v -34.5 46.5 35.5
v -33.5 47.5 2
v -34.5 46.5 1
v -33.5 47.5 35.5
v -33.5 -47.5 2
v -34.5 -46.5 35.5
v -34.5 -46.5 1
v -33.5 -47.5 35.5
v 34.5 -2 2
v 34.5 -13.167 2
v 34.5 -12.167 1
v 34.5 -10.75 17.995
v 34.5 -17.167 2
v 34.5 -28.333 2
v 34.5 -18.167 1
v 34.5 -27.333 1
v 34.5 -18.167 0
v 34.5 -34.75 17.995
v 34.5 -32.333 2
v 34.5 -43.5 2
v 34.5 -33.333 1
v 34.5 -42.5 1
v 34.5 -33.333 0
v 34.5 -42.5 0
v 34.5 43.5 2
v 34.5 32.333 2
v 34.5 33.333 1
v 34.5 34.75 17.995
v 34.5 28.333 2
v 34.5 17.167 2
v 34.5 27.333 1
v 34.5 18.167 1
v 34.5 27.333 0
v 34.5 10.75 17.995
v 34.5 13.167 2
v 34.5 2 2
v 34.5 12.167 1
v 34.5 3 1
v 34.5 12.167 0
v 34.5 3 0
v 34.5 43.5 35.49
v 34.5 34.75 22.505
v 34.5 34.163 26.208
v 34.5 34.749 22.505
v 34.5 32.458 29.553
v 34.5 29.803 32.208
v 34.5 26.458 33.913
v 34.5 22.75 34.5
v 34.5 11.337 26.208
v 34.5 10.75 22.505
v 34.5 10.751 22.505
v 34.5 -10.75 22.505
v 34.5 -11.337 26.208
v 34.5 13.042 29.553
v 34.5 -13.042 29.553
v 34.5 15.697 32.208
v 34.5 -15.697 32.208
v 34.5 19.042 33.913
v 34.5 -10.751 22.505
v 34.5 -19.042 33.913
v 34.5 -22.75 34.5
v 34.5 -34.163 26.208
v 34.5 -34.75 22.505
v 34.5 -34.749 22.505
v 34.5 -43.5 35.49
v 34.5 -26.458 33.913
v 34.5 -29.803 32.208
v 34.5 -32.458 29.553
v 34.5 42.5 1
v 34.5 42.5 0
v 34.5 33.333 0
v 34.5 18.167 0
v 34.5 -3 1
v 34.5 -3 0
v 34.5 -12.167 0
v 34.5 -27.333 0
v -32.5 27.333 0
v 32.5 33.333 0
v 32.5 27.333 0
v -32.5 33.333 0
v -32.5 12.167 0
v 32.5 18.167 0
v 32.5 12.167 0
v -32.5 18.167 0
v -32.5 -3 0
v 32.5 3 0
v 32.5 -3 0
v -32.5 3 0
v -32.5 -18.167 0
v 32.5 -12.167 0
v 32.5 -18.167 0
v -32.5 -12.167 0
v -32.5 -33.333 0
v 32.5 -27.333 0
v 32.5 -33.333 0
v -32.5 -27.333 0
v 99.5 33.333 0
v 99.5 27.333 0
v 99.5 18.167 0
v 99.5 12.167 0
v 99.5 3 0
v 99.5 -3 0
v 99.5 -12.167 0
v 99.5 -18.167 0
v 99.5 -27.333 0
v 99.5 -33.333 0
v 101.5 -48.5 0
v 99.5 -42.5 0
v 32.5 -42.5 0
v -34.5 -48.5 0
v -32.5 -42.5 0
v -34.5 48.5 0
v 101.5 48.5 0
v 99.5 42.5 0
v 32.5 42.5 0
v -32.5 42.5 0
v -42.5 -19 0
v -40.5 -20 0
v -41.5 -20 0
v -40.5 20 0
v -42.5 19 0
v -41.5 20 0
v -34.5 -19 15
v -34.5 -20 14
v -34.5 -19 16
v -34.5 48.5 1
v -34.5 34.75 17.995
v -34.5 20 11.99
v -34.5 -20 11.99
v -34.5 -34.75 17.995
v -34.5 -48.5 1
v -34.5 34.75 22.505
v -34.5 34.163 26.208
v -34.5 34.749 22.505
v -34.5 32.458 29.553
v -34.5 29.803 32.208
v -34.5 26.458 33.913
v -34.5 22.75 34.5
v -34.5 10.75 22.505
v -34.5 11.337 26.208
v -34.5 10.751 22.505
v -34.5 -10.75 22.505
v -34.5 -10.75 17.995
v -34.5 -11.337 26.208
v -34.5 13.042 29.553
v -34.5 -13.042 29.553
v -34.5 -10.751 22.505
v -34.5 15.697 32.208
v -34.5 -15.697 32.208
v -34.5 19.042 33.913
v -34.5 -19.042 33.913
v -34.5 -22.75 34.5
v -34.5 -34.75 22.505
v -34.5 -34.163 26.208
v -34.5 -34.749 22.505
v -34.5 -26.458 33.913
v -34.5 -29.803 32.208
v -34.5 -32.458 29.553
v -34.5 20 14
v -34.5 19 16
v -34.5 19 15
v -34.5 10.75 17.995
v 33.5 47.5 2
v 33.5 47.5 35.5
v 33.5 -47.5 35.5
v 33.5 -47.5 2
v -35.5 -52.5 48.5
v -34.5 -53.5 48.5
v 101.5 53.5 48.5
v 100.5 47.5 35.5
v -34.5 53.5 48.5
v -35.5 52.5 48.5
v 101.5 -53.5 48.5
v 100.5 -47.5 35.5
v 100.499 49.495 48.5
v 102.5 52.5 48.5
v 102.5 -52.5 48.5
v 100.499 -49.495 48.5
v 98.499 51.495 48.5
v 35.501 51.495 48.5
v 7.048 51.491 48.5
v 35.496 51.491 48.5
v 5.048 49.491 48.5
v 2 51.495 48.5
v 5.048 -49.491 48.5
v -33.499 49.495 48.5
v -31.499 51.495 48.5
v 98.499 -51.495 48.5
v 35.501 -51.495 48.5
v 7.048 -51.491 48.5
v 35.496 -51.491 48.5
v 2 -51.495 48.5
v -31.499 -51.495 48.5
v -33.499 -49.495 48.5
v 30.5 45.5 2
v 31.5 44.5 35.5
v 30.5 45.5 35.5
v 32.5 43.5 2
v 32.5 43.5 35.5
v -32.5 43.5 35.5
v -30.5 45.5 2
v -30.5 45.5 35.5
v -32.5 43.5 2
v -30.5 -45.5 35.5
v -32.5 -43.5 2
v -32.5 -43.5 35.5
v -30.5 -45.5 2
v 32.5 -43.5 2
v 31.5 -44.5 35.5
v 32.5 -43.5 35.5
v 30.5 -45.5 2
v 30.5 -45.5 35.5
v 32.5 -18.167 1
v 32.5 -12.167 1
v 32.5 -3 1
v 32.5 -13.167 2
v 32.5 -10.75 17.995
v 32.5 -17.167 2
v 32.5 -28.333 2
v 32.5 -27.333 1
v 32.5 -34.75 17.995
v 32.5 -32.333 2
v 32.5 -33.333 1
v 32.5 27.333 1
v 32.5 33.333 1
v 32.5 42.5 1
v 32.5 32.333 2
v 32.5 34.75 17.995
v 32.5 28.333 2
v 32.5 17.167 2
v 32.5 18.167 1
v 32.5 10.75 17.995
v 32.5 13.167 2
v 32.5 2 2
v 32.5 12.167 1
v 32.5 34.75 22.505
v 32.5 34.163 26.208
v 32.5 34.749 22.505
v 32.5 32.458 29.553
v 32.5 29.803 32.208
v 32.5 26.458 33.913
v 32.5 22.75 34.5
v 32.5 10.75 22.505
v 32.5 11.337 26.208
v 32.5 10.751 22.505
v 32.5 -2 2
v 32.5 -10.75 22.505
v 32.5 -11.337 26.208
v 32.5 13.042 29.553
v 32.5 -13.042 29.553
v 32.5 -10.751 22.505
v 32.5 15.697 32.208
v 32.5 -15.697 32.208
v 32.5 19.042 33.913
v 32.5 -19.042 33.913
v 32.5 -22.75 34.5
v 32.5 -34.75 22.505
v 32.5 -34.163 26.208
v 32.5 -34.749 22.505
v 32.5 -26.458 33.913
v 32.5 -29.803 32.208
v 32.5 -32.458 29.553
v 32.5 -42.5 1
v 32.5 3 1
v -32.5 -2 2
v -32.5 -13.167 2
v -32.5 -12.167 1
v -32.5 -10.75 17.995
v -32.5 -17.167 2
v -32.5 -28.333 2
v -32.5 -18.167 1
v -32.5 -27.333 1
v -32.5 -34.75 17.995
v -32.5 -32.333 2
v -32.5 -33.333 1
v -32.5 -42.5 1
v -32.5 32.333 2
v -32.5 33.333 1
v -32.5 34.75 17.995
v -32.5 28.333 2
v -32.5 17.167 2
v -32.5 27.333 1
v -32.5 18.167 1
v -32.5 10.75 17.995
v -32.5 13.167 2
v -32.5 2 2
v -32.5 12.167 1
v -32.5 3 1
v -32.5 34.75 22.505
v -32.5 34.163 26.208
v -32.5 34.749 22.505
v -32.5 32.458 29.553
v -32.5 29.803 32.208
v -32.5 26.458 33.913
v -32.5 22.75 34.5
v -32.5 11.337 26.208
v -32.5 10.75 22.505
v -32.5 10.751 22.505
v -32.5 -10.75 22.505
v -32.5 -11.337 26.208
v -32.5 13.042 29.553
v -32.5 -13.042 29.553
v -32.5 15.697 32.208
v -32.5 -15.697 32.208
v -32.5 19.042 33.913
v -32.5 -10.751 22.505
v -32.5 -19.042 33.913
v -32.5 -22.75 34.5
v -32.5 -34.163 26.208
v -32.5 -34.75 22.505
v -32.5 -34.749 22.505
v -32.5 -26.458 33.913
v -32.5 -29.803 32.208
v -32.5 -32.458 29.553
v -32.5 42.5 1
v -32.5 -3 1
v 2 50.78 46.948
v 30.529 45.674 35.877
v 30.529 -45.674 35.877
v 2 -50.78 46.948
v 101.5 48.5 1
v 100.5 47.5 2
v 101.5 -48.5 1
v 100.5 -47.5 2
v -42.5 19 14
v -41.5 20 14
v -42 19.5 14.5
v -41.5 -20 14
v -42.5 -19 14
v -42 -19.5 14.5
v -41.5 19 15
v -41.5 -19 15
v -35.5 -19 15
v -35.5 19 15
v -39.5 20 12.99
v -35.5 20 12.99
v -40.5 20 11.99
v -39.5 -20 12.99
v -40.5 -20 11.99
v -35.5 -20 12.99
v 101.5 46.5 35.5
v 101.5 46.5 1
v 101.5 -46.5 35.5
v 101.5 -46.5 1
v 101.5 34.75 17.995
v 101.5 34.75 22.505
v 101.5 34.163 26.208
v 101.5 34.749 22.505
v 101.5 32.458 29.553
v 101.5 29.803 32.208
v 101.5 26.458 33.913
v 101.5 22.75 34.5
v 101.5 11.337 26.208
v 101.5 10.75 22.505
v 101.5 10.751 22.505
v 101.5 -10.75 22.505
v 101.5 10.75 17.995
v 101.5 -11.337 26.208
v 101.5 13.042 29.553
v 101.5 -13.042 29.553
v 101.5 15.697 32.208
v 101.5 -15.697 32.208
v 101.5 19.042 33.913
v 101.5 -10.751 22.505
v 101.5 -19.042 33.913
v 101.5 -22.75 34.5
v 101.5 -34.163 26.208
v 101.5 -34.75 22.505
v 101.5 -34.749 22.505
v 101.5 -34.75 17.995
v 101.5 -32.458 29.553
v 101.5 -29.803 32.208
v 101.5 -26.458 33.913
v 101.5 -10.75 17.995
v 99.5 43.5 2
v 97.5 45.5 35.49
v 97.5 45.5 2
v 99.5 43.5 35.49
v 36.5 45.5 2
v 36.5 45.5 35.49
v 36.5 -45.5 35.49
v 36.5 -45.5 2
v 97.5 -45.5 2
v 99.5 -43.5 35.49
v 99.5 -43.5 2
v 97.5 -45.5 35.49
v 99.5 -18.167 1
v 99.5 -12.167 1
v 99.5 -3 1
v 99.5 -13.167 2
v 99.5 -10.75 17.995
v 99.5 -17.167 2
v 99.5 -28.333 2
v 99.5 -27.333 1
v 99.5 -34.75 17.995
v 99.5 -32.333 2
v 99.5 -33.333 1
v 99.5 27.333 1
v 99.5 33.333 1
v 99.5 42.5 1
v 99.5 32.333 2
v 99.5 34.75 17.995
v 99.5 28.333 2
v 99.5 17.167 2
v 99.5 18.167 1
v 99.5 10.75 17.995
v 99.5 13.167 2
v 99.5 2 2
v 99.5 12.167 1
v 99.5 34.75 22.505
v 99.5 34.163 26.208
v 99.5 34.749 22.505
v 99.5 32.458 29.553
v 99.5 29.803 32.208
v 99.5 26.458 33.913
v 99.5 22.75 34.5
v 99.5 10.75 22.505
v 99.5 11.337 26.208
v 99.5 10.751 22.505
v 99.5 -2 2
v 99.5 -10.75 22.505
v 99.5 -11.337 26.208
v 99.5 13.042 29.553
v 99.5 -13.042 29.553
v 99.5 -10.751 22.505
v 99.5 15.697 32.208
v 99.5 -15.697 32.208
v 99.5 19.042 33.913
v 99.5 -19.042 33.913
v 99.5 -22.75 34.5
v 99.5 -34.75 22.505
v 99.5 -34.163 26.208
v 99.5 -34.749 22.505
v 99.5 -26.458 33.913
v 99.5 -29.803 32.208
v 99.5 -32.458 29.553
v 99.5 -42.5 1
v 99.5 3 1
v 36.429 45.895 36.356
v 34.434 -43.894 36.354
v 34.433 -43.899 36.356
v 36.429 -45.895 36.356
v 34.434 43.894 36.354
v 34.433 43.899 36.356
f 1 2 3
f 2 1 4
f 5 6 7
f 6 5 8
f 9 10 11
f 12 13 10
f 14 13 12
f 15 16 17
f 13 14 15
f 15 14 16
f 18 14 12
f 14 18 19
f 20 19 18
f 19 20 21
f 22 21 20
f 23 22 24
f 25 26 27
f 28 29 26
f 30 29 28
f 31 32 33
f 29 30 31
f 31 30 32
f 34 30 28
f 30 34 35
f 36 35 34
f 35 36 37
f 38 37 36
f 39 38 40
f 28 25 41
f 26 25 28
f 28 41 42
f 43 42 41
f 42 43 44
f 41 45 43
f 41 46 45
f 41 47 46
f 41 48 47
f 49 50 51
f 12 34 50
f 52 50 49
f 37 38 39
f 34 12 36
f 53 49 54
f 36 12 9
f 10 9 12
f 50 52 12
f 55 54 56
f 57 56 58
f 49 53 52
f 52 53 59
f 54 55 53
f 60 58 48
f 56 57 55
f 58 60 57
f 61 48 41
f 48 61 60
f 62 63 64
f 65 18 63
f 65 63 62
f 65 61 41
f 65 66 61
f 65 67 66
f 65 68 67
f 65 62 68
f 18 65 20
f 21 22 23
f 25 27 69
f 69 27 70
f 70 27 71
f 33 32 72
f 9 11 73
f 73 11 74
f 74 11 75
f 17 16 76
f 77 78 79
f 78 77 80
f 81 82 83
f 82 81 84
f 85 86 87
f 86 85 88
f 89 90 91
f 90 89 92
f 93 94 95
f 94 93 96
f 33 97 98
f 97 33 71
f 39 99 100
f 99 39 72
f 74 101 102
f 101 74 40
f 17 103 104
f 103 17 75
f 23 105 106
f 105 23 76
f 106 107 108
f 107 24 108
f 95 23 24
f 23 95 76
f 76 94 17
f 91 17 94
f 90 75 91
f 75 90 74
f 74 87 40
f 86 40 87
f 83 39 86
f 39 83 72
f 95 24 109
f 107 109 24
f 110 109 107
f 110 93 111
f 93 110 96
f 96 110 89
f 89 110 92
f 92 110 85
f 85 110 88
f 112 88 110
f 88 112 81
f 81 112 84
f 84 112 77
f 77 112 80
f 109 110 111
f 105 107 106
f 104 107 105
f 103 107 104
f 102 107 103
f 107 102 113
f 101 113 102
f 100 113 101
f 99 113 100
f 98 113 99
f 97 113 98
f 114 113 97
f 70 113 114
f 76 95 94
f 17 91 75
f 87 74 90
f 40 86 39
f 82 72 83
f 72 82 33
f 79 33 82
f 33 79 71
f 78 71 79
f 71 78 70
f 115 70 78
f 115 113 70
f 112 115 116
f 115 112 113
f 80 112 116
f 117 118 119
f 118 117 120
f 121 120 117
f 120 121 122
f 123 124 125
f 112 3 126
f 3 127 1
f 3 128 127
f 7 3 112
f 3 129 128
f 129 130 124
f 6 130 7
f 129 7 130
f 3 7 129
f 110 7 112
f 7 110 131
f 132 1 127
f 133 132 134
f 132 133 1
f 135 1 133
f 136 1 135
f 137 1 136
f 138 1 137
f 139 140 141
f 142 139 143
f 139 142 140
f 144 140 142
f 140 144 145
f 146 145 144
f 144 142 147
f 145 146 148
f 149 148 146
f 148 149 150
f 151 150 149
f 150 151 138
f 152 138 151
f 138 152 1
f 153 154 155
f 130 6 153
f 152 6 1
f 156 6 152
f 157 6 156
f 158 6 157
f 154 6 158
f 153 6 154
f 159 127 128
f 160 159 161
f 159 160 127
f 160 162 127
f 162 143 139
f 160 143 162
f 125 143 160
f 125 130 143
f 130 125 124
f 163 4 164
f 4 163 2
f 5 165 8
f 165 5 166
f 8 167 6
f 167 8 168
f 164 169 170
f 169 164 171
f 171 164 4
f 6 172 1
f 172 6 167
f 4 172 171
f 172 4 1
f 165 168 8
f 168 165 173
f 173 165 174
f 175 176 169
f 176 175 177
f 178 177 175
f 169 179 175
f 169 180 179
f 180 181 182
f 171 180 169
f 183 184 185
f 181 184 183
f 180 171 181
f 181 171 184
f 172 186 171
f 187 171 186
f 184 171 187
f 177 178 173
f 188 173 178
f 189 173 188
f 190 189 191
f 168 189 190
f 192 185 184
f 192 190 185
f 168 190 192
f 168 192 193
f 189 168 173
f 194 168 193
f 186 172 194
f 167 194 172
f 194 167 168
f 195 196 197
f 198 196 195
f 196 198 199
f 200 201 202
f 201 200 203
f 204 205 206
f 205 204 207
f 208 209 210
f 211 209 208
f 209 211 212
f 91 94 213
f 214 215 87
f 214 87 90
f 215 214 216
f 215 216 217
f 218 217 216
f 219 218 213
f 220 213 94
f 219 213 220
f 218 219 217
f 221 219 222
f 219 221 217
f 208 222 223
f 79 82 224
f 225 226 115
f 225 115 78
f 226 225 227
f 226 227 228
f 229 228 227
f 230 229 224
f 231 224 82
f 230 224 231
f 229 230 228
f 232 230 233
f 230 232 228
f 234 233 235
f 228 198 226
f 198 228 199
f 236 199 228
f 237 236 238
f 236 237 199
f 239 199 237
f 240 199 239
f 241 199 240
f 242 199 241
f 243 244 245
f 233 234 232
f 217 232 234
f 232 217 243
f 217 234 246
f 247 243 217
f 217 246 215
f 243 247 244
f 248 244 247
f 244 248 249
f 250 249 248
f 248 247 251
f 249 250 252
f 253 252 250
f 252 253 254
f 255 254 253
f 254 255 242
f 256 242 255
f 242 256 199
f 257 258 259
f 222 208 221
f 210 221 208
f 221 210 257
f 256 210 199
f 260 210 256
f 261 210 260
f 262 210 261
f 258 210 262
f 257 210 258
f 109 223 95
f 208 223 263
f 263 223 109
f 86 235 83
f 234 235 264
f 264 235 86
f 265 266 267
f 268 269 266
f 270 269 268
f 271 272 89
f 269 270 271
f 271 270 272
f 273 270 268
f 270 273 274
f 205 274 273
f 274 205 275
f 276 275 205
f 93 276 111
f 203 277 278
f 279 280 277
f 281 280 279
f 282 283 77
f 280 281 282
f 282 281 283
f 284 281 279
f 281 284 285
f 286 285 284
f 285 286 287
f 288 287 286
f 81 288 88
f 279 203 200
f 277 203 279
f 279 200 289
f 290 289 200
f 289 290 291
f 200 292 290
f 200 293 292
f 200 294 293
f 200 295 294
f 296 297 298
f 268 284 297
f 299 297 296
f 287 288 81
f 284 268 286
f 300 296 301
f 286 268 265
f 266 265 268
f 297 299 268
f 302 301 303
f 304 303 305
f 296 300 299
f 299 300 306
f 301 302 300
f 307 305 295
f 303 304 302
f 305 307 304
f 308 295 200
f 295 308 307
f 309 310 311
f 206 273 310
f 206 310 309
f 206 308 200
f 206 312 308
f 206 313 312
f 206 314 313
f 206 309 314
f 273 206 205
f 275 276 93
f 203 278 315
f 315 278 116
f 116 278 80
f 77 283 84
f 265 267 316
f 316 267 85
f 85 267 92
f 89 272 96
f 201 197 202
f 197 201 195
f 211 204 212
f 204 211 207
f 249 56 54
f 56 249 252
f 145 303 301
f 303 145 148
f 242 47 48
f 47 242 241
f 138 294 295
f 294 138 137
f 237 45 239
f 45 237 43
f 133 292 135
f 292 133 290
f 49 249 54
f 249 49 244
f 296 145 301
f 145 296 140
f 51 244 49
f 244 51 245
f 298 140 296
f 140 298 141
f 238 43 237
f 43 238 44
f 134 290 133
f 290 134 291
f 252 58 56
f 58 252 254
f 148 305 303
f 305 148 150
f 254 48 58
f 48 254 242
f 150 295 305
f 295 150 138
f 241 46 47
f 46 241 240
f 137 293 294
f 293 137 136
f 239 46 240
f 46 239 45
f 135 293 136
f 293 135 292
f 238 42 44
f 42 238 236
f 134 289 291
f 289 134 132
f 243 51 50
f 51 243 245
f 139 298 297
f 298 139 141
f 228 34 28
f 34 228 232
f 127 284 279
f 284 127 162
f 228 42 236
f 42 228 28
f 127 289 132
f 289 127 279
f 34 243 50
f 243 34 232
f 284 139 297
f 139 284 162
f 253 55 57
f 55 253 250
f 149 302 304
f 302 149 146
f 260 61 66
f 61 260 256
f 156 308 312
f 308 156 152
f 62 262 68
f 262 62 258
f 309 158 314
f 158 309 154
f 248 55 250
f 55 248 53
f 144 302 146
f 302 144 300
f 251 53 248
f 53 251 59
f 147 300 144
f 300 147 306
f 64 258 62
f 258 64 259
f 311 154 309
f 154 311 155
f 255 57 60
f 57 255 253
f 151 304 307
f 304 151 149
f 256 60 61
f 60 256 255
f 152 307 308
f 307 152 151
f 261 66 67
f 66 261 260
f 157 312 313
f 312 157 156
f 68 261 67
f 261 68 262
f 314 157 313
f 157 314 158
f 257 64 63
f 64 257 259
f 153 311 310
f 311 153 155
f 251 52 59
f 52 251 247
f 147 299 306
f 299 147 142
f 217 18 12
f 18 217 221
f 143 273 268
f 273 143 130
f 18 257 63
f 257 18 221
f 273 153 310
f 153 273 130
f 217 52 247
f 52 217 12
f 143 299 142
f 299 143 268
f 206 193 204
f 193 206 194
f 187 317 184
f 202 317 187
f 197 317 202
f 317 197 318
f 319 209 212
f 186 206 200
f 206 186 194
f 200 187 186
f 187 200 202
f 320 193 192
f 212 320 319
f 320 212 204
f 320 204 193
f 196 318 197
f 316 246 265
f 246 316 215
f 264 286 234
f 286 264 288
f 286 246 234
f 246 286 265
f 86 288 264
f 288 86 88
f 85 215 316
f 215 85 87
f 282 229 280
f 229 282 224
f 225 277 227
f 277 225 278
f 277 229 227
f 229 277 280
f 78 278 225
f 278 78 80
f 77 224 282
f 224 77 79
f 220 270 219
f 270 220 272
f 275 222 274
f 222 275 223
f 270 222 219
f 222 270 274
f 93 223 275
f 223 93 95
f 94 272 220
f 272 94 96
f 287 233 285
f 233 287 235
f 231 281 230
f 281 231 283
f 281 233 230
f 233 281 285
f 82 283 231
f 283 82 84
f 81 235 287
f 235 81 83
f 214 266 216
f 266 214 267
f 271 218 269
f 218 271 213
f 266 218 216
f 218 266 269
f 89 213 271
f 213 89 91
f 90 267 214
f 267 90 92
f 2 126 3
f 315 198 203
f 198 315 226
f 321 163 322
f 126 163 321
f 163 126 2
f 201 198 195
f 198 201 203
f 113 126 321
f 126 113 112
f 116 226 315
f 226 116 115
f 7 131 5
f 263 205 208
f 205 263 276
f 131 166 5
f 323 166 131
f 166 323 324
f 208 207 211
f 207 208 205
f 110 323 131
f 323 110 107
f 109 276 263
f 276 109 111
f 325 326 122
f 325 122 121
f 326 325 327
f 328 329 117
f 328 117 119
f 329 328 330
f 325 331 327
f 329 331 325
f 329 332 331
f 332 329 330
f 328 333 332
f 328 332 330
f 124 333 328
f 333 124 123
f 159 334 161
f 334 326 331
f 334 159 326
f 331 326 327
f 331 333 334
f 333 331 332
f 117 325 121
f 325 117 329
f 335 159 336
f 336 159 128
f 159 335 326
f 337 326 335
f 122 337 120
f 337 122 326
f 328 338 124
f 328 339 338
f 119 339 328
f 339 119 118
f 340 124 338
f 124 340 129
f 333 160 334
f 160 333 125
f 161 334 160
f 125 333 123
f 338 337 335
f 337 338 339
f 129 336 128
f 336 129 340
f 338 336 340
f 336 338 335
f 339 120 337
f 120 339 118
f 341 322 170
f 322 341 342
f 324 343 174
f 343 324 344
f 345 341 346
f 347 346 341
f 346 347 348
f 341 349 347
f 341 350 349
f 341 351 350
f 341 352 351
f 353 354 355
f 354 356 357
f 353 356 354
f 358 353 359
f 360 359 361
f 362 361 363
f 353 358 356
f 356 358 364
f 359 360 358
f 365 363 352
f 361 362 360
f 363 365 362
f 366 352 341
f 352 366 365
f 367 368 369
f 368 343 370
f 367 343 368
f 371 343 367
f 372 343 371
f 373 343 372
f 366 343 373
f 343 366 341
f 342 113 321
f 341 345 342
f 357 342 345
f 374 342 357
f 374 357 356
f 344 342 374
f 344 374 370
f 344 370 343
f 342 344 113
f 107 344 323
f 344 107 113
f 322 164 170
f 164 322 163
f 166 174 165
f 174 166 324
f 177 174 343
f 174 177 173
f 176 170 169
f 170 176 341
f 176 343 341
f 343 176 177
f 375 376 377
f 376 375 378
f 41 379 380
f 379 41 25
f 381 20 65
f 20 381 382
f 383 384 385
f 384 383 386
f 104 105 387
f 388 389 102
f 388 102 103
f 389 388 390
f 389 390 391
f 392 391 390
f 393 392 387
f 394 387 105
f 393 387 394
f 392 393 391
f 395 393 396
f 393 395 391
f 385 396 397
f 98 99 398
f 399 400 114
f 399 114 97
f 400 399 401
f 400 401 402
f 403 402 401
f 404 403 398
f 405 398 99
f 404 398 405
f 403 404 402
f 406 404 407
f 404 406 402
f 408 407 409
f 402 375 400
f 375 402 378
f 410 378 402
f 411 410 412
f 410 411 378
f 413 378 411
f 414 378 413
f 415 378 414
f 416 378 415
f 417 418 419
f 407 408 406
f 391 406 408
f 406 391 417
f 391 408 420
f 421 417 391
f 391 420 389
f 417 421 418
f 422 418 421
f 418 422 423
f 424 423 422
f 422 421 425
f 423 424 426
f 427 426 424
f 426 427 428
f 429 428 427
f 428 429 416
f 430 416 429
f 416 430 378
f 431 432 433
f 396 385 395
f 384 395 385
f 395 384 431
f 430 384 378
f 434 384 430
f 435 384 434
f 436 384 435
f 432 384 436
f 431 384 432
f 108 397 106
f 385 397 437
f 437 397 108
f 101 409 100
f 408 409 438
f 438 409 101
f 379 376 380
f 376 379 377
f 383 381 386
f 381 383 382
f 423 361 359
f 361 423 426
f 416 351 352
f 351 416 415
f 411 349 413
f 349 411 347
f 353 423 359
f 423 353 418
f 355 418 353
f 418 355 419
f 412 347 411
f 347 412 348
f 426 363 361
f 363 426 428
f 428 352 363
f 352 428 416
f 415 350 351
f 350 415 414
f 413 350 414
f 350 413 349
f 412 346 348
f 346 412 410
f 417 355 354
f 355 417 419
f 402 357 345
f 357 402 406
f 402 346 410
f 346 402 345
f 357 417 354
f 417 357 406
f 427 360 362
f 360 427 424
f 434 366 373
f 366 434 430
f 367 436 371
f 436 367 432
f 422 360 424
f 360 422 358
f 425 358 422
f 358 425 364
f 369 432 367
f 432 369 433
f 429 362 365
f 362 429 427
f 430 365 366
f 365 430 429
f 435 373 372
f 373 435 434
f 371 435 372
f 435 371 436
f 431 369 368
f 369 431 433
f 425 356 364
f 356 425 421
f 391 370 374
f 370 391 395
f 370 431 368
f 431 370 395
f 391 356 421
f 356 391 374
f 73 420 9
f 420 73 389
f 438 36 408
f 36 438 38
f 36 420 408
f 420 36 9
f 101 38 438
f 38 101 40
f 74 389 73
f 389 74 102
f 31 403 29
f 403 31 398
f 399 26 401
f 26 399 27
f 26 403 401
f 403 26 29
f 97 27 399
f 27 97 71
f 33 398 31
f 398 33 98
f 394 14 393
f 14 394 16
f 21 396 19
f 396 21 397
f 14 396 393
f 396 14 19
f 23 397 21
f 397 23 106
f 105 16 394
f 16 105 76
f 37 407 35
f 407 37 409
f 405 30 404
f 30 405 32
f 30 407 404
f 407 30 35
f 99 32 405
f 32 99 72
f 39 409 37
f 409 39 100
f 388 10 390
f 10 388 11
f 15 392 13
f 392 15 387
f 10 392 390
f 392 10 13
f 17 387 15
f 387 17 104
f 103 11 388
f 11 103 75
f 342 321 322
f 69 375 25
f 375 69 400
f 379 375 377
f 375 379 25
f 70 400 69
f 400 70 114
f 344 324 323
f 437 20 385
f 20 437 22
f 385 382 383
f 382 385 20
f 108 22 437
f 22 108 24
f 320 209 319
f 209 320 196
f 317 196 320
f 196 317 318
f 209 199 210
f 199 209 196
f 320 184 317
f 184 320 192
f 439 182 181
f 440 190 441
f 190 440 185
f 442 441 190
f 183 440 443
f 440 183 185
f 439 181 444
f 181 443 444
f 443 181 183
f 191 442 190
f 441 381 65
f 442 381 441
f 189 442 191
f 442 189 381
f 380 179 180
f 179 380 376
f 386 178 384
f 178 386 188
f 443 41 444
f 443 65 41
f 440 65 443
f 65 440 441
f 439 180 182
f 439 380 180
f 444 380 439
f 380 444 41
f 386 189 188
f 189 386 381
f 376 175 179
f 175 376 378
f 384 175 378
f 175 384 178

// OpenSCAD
// file: base_objects.scad
/*

  base_objects.scad
  
  (c) olikraus@gmail.com

  This work is licensed under the Creative Commons Attribution-NonCommercial-ShareAlike 4.0 International License.
  To view a copy of this license, visit http://creativecommons.org/licenses/by-nc-sa/4.0/.

  SquareFrustum(bottom=[10,10], top=[0,0], h=10, ChamferBody=1)
  CenterCube(dim, ChamferBody = 0, ChamferBottom=0, ChamferTop=0)
  Archoid(r=10, b=20, l=30)

*/


/*
  SquareFrustum(bottom=[10,10], top=[0,0], h=10)
  https://en.wikipedia.org/wiki/Frustum
  
  Args:
    buttom: Bottom square (width, height)
    top: Top square (width, height)
    h: Distance of the top square to z=0 plane
    ChamferBody: The amount to chamfer for edges parallel to z axis
  Notes:
    The bottom square is placed in the z=0 plane.
    The squares are centered around z axis.
  Example:
    SquareFrustum([20,20], [10,4], h=20);
    

    // create a rectangle bowl
    // same example as for CenterCube
    // SquareFrustum might be more flexible because it is not
    // restricted to the 45 degree chamfer
    
    union() {
      wallthickness=2;
      xwidth = 10;
      ywidth = 20;
      height = 5;
      translate([0,0,wallthickness])
      difference() {
        CenterCube([xwidth+2*wallthickness,ywidth+2*wallthickness,5-wallthickness]);
        CenterCube([xwidth,ywidth,5-wallthickness+0.01]);
      }    
      SquareFrustum(
        bottom=[xwidth,ywidth], 
        top=[xwidth+2*wallthickness,ywidth+2*wallthickness], 
        h=wallthickness);
    }
    
*/
module SquareFrustum_old(bottom=[10,10], top=[0,0], h=10) {
  lx = bottom[0];
  ly = bottom[1];
  ux = top[0];
  uy = top[1];
  p = [
    [ -lx/2, -ly/2,  0 ],  //0
    [ lx/2,  -ly/2,  0 ],  //1
    [ lx/2,  ly/2,  0 ],  //2
    [ -lx/2,  ly/2,  0 ],  //3
    [ -ux/2, -uy/2,  h ],  //4
    [ ux/2,  -uy/2,  h ],  //5
    [ ux/2,  uy/2,  h ],  //6
    [ -ux/2,  uy/2,  h ]]; //7
    
  f = [
    [0,1,2,3],  // bottom
    [4,5,1,0],  // front
    [7,6,5,4],  // top
    [5,6,2,1],  // right
    [6,7,3,2],  // back
    [7,4,0,3]]; // left
  polyhedron( p, f );
}

module SquareFrustum(bottom=[10,10], top=[0,0], h=10, ChamferBody=0) {
  c = ChamferBody/2;
  lx = bottom[0]-2*c;
  ly = bottom[1]-2*c;
  ux = top[0]-2*c;
  uy = top[1]-2*c;
  p = [
    [ -lx/2-c, -ly/2+c,  0 ],  //0 / 0, 0
    [ -lx/2+c, -ly/2-c,  0 ],  //0 / 1, 1
  
    [ lx/2-c,  -ly/2-c,  0 ],  //1 / 0, 2
    [ lx/2+c,  -ly/2+c,  0 ],  //1 / 1, 3
  
    [ lx/2+c,  ly/2-c,  0 ],  //2 / 0, 4
    [ lx/2-c,  ly/2+c,  0 ],  //2 / 1, 5
  
    [ -lx/2+c,  ly/2+c,  0 ],  //3 / 0, 6
    [ -lx/2-c,  ly/2-c,  0 ],  //3 / 1, 7
  
    [ -ux/2-c, -uy/2+c,  h ],  //4 / 0, 8
    [ -ux/2+c, -uy/2-c,  h ],  //4 / 1, 9
  
    [ ux/2-c,  -uy/2-c,  h ],  //5 / 0, 10
    [ ux/2+c,  -uy/2+c,  h ],  //5 / 1, 11
 
    [ ux/2+c,  uy/2-c,  h ],  //6 / 0, 12
    [ ux/2-c,  uy/2+c,  h ],  //6 / 1, 13
    
    [ -ux/2+c,  uy/2+c,  h ], //7 / 0, 14
    [ -ux/2-c,  uy/2-c,  h ]]; //7 / 1, 15
    
  f = [
    [0,1,2,3,4,5,6,7],  // bottom
    [8,9,1,0], // front left
    [9,10,2,1],  // front 
    [10,11,3,2], // front right
    [15,14,13,12,11,10,9,8],  // top
    [11,12,4,3],  // right
    [12,13,5,4],  // back right
    [13,14,6,5],  // back
    [14,15,7,6], // back left
    [15,8,0,7]]; // left
  polyhedron( p, f );
}


/*
  ChamferZCube(w=1,h=10)

  A cube, which can be used to chamfer along the z axis

  Args:
    w: The width of the cube is sqrt(2)*w
    h: Height of the cube
    d: The cube has a descent below z=0 plane and an ascent beyond h by this value
  Notes:
    The cube is centered around z-axsis and placed on z=0 plane.

*/
module ChamferZCube(w=1,h=10, d=0) {
  translate([0,0,h/2])
  rotate([0,0,45])
  cube([sqrt(2)*w,sqrt(2)*w,h+2*d], center=true);
}

module ChamferXCube(w=1,h=10, d=0) {
  rotate([45,0,0])
  cube([h+2*d,sqrt(2)*w,sqrt(2)*w], center=true);
}

module ChamferYCube(w=1,h=10, d=0) {
  rotate([0,45,0])
  cube([sqrt(2)*w,h+2*d,sqrt(2)*w], center=true);
}

/*
  CenterCube(dim, ChamferBody = 0, ChamferBottom=0, ChamferTop=0)

  A cube which is centered along z axis but is placed on z=0 plane
  Optionally allows chamfer along z axis.

  Args:
    dim: Same as for cube(dim)
    ChamferBody: The amount to chamfer for edges parallel to z axis
    ChamferBottom: The amount to chamfer for edges in z=0 plane
    ChamferTop: The amount to chamfer for edges in z=dim[2] plane
  Example:
    CenterCube([10, 20, 5]);

    // create a rectangle bowl
    // thanks to chamfer no support is required with 3d print
    difference() {  
      wallthickness=2;
      xwidth = 10;
      ywidth = 20;
      height = 5;
      CenterCube( 
        [xwidth+2*wallthickness, ywidth+2*wallthickness, height], 
        ChamferBottom = wallthickness);
      translate([0,0,wallthickness])
      CenterCube([xwidth,ywidth,height]);
    }

*/

module CenterCube(dim, ChamferBody = 0, ChamferBottom=0, ChamferTop=0) {
  difference() {
    translate([0,0,dim[2]/2])
    cube(dim, center=true);

    if ( ChamferBody > 0 ) {
      translate([dim[0]/2,dim[1]/2,0])
      ChamferZCube(w=ChamferBody,h=dim[2],d=0.01);
      
      translate([-dim[0]/2,dim[1]/2,0])
      ChamferZCube(w=ChamferBody,h=dim[2],d=0.01);

      translate([-dim[0]/2,-dim[1]/2,0])
      ChamferZCube(w=ChamferBody,h=dim[2],d=0.01);

      translate([dim[0]/2,-dim[1]/2,0])
      ChamferZCube(w=ChamferBody,h=dim[2],d=0.01);
    }
    
    if ( ChamferBottom > 0 )
    {
      translate([-dim[0]/2,0,0])
      ChamferYCube(w=ChamferBottom,h=dim[1],d=0.01);

      translate([dim[0]/2,0,0])
      ChamferYCube(w=ChamferBottom,h=dim[1],d=0.01);

      translate([0,-dim[1]/2,0])
      ChamferXCube(w=ChamferBottom,h=dim[0],d=0.01);

      translate([0,dim[1]/2,0])
      ChamferXCube(w=ChamferBottom,h=dim[0],d=0.01);
    }
    
    if ( ChamferTop > 0 )
    {
      translate([-dim[0]/2,0,dim[2]])
      ChamferYCube(w=ChamferTop,h=dim[1],d=0.01);

      translate([dim[0]/2,0,dim[2]])
      ChamferYCube(w=ChamferTop,h=dim[1],d=0.01);

      translate([0,-dim[1]/2,dim[2]])
      ChamferXCube(w=ChamferTop,h=dim[0],d=0.01);

      translate([0,dim[1]/2,dim[2]])
      ChamferXCube(w=ChamferTop,h=dim[0],d=0.01);
    }
    
  }
}

/*
  Archoid(r=10, b=20, l=30)

  A chest like element with a half cylinder on the top
  and a box as a base.
  If used with difference, the result is a archway.

  Args:
    r: Radius of the half-cylinder
    b: height of the base block
    l: length of the chest in x direction.
    $fn: resolution of the half cylinder
  Notes:
    The width of the chest is 2*r, the height is b+r.
    Archoid(r=10, b=20, l=30, $fn=4) becomes a house.

*/
module Archoid(r=10, b=20, l=30) {
  union() {
    translate([0,0,b])
    difference() {
      rotate([0,90,0])
      cylinder(r=r,h=l,center=true);
      translate([0,0,-r])
      cube([2*l,2*l,2*r], center=true);
    }
    translate([0,0,b/2])
    cube([l,2*r,b+0.01], center=true);
  }
}
// main file
/*

  ccm_double_basket.scad
  
  (c) olikraus@gmail.com

  This work is licensed under the Creative Commons Attribution-NonCommercial-ShareAlike 4.0 International License.
  To view a copy of this license, visit http://creativecommons.org/licenses/by-nc-sa/4.0/.

 6 Jun 2021
  - Lower total height --> DONE
  - Shrink side openings --> DONE
  
 12 Jun 2021
  - Close smaller openings --> DONE
  - Make a ramp with the bottom lines (raw_baskeet)

*/

include <card_compare_machine.scad>;




//translate([-card_width*1.15,0,0])
//sorter_house();
ccm_double_basket();
//ccm_basket();
